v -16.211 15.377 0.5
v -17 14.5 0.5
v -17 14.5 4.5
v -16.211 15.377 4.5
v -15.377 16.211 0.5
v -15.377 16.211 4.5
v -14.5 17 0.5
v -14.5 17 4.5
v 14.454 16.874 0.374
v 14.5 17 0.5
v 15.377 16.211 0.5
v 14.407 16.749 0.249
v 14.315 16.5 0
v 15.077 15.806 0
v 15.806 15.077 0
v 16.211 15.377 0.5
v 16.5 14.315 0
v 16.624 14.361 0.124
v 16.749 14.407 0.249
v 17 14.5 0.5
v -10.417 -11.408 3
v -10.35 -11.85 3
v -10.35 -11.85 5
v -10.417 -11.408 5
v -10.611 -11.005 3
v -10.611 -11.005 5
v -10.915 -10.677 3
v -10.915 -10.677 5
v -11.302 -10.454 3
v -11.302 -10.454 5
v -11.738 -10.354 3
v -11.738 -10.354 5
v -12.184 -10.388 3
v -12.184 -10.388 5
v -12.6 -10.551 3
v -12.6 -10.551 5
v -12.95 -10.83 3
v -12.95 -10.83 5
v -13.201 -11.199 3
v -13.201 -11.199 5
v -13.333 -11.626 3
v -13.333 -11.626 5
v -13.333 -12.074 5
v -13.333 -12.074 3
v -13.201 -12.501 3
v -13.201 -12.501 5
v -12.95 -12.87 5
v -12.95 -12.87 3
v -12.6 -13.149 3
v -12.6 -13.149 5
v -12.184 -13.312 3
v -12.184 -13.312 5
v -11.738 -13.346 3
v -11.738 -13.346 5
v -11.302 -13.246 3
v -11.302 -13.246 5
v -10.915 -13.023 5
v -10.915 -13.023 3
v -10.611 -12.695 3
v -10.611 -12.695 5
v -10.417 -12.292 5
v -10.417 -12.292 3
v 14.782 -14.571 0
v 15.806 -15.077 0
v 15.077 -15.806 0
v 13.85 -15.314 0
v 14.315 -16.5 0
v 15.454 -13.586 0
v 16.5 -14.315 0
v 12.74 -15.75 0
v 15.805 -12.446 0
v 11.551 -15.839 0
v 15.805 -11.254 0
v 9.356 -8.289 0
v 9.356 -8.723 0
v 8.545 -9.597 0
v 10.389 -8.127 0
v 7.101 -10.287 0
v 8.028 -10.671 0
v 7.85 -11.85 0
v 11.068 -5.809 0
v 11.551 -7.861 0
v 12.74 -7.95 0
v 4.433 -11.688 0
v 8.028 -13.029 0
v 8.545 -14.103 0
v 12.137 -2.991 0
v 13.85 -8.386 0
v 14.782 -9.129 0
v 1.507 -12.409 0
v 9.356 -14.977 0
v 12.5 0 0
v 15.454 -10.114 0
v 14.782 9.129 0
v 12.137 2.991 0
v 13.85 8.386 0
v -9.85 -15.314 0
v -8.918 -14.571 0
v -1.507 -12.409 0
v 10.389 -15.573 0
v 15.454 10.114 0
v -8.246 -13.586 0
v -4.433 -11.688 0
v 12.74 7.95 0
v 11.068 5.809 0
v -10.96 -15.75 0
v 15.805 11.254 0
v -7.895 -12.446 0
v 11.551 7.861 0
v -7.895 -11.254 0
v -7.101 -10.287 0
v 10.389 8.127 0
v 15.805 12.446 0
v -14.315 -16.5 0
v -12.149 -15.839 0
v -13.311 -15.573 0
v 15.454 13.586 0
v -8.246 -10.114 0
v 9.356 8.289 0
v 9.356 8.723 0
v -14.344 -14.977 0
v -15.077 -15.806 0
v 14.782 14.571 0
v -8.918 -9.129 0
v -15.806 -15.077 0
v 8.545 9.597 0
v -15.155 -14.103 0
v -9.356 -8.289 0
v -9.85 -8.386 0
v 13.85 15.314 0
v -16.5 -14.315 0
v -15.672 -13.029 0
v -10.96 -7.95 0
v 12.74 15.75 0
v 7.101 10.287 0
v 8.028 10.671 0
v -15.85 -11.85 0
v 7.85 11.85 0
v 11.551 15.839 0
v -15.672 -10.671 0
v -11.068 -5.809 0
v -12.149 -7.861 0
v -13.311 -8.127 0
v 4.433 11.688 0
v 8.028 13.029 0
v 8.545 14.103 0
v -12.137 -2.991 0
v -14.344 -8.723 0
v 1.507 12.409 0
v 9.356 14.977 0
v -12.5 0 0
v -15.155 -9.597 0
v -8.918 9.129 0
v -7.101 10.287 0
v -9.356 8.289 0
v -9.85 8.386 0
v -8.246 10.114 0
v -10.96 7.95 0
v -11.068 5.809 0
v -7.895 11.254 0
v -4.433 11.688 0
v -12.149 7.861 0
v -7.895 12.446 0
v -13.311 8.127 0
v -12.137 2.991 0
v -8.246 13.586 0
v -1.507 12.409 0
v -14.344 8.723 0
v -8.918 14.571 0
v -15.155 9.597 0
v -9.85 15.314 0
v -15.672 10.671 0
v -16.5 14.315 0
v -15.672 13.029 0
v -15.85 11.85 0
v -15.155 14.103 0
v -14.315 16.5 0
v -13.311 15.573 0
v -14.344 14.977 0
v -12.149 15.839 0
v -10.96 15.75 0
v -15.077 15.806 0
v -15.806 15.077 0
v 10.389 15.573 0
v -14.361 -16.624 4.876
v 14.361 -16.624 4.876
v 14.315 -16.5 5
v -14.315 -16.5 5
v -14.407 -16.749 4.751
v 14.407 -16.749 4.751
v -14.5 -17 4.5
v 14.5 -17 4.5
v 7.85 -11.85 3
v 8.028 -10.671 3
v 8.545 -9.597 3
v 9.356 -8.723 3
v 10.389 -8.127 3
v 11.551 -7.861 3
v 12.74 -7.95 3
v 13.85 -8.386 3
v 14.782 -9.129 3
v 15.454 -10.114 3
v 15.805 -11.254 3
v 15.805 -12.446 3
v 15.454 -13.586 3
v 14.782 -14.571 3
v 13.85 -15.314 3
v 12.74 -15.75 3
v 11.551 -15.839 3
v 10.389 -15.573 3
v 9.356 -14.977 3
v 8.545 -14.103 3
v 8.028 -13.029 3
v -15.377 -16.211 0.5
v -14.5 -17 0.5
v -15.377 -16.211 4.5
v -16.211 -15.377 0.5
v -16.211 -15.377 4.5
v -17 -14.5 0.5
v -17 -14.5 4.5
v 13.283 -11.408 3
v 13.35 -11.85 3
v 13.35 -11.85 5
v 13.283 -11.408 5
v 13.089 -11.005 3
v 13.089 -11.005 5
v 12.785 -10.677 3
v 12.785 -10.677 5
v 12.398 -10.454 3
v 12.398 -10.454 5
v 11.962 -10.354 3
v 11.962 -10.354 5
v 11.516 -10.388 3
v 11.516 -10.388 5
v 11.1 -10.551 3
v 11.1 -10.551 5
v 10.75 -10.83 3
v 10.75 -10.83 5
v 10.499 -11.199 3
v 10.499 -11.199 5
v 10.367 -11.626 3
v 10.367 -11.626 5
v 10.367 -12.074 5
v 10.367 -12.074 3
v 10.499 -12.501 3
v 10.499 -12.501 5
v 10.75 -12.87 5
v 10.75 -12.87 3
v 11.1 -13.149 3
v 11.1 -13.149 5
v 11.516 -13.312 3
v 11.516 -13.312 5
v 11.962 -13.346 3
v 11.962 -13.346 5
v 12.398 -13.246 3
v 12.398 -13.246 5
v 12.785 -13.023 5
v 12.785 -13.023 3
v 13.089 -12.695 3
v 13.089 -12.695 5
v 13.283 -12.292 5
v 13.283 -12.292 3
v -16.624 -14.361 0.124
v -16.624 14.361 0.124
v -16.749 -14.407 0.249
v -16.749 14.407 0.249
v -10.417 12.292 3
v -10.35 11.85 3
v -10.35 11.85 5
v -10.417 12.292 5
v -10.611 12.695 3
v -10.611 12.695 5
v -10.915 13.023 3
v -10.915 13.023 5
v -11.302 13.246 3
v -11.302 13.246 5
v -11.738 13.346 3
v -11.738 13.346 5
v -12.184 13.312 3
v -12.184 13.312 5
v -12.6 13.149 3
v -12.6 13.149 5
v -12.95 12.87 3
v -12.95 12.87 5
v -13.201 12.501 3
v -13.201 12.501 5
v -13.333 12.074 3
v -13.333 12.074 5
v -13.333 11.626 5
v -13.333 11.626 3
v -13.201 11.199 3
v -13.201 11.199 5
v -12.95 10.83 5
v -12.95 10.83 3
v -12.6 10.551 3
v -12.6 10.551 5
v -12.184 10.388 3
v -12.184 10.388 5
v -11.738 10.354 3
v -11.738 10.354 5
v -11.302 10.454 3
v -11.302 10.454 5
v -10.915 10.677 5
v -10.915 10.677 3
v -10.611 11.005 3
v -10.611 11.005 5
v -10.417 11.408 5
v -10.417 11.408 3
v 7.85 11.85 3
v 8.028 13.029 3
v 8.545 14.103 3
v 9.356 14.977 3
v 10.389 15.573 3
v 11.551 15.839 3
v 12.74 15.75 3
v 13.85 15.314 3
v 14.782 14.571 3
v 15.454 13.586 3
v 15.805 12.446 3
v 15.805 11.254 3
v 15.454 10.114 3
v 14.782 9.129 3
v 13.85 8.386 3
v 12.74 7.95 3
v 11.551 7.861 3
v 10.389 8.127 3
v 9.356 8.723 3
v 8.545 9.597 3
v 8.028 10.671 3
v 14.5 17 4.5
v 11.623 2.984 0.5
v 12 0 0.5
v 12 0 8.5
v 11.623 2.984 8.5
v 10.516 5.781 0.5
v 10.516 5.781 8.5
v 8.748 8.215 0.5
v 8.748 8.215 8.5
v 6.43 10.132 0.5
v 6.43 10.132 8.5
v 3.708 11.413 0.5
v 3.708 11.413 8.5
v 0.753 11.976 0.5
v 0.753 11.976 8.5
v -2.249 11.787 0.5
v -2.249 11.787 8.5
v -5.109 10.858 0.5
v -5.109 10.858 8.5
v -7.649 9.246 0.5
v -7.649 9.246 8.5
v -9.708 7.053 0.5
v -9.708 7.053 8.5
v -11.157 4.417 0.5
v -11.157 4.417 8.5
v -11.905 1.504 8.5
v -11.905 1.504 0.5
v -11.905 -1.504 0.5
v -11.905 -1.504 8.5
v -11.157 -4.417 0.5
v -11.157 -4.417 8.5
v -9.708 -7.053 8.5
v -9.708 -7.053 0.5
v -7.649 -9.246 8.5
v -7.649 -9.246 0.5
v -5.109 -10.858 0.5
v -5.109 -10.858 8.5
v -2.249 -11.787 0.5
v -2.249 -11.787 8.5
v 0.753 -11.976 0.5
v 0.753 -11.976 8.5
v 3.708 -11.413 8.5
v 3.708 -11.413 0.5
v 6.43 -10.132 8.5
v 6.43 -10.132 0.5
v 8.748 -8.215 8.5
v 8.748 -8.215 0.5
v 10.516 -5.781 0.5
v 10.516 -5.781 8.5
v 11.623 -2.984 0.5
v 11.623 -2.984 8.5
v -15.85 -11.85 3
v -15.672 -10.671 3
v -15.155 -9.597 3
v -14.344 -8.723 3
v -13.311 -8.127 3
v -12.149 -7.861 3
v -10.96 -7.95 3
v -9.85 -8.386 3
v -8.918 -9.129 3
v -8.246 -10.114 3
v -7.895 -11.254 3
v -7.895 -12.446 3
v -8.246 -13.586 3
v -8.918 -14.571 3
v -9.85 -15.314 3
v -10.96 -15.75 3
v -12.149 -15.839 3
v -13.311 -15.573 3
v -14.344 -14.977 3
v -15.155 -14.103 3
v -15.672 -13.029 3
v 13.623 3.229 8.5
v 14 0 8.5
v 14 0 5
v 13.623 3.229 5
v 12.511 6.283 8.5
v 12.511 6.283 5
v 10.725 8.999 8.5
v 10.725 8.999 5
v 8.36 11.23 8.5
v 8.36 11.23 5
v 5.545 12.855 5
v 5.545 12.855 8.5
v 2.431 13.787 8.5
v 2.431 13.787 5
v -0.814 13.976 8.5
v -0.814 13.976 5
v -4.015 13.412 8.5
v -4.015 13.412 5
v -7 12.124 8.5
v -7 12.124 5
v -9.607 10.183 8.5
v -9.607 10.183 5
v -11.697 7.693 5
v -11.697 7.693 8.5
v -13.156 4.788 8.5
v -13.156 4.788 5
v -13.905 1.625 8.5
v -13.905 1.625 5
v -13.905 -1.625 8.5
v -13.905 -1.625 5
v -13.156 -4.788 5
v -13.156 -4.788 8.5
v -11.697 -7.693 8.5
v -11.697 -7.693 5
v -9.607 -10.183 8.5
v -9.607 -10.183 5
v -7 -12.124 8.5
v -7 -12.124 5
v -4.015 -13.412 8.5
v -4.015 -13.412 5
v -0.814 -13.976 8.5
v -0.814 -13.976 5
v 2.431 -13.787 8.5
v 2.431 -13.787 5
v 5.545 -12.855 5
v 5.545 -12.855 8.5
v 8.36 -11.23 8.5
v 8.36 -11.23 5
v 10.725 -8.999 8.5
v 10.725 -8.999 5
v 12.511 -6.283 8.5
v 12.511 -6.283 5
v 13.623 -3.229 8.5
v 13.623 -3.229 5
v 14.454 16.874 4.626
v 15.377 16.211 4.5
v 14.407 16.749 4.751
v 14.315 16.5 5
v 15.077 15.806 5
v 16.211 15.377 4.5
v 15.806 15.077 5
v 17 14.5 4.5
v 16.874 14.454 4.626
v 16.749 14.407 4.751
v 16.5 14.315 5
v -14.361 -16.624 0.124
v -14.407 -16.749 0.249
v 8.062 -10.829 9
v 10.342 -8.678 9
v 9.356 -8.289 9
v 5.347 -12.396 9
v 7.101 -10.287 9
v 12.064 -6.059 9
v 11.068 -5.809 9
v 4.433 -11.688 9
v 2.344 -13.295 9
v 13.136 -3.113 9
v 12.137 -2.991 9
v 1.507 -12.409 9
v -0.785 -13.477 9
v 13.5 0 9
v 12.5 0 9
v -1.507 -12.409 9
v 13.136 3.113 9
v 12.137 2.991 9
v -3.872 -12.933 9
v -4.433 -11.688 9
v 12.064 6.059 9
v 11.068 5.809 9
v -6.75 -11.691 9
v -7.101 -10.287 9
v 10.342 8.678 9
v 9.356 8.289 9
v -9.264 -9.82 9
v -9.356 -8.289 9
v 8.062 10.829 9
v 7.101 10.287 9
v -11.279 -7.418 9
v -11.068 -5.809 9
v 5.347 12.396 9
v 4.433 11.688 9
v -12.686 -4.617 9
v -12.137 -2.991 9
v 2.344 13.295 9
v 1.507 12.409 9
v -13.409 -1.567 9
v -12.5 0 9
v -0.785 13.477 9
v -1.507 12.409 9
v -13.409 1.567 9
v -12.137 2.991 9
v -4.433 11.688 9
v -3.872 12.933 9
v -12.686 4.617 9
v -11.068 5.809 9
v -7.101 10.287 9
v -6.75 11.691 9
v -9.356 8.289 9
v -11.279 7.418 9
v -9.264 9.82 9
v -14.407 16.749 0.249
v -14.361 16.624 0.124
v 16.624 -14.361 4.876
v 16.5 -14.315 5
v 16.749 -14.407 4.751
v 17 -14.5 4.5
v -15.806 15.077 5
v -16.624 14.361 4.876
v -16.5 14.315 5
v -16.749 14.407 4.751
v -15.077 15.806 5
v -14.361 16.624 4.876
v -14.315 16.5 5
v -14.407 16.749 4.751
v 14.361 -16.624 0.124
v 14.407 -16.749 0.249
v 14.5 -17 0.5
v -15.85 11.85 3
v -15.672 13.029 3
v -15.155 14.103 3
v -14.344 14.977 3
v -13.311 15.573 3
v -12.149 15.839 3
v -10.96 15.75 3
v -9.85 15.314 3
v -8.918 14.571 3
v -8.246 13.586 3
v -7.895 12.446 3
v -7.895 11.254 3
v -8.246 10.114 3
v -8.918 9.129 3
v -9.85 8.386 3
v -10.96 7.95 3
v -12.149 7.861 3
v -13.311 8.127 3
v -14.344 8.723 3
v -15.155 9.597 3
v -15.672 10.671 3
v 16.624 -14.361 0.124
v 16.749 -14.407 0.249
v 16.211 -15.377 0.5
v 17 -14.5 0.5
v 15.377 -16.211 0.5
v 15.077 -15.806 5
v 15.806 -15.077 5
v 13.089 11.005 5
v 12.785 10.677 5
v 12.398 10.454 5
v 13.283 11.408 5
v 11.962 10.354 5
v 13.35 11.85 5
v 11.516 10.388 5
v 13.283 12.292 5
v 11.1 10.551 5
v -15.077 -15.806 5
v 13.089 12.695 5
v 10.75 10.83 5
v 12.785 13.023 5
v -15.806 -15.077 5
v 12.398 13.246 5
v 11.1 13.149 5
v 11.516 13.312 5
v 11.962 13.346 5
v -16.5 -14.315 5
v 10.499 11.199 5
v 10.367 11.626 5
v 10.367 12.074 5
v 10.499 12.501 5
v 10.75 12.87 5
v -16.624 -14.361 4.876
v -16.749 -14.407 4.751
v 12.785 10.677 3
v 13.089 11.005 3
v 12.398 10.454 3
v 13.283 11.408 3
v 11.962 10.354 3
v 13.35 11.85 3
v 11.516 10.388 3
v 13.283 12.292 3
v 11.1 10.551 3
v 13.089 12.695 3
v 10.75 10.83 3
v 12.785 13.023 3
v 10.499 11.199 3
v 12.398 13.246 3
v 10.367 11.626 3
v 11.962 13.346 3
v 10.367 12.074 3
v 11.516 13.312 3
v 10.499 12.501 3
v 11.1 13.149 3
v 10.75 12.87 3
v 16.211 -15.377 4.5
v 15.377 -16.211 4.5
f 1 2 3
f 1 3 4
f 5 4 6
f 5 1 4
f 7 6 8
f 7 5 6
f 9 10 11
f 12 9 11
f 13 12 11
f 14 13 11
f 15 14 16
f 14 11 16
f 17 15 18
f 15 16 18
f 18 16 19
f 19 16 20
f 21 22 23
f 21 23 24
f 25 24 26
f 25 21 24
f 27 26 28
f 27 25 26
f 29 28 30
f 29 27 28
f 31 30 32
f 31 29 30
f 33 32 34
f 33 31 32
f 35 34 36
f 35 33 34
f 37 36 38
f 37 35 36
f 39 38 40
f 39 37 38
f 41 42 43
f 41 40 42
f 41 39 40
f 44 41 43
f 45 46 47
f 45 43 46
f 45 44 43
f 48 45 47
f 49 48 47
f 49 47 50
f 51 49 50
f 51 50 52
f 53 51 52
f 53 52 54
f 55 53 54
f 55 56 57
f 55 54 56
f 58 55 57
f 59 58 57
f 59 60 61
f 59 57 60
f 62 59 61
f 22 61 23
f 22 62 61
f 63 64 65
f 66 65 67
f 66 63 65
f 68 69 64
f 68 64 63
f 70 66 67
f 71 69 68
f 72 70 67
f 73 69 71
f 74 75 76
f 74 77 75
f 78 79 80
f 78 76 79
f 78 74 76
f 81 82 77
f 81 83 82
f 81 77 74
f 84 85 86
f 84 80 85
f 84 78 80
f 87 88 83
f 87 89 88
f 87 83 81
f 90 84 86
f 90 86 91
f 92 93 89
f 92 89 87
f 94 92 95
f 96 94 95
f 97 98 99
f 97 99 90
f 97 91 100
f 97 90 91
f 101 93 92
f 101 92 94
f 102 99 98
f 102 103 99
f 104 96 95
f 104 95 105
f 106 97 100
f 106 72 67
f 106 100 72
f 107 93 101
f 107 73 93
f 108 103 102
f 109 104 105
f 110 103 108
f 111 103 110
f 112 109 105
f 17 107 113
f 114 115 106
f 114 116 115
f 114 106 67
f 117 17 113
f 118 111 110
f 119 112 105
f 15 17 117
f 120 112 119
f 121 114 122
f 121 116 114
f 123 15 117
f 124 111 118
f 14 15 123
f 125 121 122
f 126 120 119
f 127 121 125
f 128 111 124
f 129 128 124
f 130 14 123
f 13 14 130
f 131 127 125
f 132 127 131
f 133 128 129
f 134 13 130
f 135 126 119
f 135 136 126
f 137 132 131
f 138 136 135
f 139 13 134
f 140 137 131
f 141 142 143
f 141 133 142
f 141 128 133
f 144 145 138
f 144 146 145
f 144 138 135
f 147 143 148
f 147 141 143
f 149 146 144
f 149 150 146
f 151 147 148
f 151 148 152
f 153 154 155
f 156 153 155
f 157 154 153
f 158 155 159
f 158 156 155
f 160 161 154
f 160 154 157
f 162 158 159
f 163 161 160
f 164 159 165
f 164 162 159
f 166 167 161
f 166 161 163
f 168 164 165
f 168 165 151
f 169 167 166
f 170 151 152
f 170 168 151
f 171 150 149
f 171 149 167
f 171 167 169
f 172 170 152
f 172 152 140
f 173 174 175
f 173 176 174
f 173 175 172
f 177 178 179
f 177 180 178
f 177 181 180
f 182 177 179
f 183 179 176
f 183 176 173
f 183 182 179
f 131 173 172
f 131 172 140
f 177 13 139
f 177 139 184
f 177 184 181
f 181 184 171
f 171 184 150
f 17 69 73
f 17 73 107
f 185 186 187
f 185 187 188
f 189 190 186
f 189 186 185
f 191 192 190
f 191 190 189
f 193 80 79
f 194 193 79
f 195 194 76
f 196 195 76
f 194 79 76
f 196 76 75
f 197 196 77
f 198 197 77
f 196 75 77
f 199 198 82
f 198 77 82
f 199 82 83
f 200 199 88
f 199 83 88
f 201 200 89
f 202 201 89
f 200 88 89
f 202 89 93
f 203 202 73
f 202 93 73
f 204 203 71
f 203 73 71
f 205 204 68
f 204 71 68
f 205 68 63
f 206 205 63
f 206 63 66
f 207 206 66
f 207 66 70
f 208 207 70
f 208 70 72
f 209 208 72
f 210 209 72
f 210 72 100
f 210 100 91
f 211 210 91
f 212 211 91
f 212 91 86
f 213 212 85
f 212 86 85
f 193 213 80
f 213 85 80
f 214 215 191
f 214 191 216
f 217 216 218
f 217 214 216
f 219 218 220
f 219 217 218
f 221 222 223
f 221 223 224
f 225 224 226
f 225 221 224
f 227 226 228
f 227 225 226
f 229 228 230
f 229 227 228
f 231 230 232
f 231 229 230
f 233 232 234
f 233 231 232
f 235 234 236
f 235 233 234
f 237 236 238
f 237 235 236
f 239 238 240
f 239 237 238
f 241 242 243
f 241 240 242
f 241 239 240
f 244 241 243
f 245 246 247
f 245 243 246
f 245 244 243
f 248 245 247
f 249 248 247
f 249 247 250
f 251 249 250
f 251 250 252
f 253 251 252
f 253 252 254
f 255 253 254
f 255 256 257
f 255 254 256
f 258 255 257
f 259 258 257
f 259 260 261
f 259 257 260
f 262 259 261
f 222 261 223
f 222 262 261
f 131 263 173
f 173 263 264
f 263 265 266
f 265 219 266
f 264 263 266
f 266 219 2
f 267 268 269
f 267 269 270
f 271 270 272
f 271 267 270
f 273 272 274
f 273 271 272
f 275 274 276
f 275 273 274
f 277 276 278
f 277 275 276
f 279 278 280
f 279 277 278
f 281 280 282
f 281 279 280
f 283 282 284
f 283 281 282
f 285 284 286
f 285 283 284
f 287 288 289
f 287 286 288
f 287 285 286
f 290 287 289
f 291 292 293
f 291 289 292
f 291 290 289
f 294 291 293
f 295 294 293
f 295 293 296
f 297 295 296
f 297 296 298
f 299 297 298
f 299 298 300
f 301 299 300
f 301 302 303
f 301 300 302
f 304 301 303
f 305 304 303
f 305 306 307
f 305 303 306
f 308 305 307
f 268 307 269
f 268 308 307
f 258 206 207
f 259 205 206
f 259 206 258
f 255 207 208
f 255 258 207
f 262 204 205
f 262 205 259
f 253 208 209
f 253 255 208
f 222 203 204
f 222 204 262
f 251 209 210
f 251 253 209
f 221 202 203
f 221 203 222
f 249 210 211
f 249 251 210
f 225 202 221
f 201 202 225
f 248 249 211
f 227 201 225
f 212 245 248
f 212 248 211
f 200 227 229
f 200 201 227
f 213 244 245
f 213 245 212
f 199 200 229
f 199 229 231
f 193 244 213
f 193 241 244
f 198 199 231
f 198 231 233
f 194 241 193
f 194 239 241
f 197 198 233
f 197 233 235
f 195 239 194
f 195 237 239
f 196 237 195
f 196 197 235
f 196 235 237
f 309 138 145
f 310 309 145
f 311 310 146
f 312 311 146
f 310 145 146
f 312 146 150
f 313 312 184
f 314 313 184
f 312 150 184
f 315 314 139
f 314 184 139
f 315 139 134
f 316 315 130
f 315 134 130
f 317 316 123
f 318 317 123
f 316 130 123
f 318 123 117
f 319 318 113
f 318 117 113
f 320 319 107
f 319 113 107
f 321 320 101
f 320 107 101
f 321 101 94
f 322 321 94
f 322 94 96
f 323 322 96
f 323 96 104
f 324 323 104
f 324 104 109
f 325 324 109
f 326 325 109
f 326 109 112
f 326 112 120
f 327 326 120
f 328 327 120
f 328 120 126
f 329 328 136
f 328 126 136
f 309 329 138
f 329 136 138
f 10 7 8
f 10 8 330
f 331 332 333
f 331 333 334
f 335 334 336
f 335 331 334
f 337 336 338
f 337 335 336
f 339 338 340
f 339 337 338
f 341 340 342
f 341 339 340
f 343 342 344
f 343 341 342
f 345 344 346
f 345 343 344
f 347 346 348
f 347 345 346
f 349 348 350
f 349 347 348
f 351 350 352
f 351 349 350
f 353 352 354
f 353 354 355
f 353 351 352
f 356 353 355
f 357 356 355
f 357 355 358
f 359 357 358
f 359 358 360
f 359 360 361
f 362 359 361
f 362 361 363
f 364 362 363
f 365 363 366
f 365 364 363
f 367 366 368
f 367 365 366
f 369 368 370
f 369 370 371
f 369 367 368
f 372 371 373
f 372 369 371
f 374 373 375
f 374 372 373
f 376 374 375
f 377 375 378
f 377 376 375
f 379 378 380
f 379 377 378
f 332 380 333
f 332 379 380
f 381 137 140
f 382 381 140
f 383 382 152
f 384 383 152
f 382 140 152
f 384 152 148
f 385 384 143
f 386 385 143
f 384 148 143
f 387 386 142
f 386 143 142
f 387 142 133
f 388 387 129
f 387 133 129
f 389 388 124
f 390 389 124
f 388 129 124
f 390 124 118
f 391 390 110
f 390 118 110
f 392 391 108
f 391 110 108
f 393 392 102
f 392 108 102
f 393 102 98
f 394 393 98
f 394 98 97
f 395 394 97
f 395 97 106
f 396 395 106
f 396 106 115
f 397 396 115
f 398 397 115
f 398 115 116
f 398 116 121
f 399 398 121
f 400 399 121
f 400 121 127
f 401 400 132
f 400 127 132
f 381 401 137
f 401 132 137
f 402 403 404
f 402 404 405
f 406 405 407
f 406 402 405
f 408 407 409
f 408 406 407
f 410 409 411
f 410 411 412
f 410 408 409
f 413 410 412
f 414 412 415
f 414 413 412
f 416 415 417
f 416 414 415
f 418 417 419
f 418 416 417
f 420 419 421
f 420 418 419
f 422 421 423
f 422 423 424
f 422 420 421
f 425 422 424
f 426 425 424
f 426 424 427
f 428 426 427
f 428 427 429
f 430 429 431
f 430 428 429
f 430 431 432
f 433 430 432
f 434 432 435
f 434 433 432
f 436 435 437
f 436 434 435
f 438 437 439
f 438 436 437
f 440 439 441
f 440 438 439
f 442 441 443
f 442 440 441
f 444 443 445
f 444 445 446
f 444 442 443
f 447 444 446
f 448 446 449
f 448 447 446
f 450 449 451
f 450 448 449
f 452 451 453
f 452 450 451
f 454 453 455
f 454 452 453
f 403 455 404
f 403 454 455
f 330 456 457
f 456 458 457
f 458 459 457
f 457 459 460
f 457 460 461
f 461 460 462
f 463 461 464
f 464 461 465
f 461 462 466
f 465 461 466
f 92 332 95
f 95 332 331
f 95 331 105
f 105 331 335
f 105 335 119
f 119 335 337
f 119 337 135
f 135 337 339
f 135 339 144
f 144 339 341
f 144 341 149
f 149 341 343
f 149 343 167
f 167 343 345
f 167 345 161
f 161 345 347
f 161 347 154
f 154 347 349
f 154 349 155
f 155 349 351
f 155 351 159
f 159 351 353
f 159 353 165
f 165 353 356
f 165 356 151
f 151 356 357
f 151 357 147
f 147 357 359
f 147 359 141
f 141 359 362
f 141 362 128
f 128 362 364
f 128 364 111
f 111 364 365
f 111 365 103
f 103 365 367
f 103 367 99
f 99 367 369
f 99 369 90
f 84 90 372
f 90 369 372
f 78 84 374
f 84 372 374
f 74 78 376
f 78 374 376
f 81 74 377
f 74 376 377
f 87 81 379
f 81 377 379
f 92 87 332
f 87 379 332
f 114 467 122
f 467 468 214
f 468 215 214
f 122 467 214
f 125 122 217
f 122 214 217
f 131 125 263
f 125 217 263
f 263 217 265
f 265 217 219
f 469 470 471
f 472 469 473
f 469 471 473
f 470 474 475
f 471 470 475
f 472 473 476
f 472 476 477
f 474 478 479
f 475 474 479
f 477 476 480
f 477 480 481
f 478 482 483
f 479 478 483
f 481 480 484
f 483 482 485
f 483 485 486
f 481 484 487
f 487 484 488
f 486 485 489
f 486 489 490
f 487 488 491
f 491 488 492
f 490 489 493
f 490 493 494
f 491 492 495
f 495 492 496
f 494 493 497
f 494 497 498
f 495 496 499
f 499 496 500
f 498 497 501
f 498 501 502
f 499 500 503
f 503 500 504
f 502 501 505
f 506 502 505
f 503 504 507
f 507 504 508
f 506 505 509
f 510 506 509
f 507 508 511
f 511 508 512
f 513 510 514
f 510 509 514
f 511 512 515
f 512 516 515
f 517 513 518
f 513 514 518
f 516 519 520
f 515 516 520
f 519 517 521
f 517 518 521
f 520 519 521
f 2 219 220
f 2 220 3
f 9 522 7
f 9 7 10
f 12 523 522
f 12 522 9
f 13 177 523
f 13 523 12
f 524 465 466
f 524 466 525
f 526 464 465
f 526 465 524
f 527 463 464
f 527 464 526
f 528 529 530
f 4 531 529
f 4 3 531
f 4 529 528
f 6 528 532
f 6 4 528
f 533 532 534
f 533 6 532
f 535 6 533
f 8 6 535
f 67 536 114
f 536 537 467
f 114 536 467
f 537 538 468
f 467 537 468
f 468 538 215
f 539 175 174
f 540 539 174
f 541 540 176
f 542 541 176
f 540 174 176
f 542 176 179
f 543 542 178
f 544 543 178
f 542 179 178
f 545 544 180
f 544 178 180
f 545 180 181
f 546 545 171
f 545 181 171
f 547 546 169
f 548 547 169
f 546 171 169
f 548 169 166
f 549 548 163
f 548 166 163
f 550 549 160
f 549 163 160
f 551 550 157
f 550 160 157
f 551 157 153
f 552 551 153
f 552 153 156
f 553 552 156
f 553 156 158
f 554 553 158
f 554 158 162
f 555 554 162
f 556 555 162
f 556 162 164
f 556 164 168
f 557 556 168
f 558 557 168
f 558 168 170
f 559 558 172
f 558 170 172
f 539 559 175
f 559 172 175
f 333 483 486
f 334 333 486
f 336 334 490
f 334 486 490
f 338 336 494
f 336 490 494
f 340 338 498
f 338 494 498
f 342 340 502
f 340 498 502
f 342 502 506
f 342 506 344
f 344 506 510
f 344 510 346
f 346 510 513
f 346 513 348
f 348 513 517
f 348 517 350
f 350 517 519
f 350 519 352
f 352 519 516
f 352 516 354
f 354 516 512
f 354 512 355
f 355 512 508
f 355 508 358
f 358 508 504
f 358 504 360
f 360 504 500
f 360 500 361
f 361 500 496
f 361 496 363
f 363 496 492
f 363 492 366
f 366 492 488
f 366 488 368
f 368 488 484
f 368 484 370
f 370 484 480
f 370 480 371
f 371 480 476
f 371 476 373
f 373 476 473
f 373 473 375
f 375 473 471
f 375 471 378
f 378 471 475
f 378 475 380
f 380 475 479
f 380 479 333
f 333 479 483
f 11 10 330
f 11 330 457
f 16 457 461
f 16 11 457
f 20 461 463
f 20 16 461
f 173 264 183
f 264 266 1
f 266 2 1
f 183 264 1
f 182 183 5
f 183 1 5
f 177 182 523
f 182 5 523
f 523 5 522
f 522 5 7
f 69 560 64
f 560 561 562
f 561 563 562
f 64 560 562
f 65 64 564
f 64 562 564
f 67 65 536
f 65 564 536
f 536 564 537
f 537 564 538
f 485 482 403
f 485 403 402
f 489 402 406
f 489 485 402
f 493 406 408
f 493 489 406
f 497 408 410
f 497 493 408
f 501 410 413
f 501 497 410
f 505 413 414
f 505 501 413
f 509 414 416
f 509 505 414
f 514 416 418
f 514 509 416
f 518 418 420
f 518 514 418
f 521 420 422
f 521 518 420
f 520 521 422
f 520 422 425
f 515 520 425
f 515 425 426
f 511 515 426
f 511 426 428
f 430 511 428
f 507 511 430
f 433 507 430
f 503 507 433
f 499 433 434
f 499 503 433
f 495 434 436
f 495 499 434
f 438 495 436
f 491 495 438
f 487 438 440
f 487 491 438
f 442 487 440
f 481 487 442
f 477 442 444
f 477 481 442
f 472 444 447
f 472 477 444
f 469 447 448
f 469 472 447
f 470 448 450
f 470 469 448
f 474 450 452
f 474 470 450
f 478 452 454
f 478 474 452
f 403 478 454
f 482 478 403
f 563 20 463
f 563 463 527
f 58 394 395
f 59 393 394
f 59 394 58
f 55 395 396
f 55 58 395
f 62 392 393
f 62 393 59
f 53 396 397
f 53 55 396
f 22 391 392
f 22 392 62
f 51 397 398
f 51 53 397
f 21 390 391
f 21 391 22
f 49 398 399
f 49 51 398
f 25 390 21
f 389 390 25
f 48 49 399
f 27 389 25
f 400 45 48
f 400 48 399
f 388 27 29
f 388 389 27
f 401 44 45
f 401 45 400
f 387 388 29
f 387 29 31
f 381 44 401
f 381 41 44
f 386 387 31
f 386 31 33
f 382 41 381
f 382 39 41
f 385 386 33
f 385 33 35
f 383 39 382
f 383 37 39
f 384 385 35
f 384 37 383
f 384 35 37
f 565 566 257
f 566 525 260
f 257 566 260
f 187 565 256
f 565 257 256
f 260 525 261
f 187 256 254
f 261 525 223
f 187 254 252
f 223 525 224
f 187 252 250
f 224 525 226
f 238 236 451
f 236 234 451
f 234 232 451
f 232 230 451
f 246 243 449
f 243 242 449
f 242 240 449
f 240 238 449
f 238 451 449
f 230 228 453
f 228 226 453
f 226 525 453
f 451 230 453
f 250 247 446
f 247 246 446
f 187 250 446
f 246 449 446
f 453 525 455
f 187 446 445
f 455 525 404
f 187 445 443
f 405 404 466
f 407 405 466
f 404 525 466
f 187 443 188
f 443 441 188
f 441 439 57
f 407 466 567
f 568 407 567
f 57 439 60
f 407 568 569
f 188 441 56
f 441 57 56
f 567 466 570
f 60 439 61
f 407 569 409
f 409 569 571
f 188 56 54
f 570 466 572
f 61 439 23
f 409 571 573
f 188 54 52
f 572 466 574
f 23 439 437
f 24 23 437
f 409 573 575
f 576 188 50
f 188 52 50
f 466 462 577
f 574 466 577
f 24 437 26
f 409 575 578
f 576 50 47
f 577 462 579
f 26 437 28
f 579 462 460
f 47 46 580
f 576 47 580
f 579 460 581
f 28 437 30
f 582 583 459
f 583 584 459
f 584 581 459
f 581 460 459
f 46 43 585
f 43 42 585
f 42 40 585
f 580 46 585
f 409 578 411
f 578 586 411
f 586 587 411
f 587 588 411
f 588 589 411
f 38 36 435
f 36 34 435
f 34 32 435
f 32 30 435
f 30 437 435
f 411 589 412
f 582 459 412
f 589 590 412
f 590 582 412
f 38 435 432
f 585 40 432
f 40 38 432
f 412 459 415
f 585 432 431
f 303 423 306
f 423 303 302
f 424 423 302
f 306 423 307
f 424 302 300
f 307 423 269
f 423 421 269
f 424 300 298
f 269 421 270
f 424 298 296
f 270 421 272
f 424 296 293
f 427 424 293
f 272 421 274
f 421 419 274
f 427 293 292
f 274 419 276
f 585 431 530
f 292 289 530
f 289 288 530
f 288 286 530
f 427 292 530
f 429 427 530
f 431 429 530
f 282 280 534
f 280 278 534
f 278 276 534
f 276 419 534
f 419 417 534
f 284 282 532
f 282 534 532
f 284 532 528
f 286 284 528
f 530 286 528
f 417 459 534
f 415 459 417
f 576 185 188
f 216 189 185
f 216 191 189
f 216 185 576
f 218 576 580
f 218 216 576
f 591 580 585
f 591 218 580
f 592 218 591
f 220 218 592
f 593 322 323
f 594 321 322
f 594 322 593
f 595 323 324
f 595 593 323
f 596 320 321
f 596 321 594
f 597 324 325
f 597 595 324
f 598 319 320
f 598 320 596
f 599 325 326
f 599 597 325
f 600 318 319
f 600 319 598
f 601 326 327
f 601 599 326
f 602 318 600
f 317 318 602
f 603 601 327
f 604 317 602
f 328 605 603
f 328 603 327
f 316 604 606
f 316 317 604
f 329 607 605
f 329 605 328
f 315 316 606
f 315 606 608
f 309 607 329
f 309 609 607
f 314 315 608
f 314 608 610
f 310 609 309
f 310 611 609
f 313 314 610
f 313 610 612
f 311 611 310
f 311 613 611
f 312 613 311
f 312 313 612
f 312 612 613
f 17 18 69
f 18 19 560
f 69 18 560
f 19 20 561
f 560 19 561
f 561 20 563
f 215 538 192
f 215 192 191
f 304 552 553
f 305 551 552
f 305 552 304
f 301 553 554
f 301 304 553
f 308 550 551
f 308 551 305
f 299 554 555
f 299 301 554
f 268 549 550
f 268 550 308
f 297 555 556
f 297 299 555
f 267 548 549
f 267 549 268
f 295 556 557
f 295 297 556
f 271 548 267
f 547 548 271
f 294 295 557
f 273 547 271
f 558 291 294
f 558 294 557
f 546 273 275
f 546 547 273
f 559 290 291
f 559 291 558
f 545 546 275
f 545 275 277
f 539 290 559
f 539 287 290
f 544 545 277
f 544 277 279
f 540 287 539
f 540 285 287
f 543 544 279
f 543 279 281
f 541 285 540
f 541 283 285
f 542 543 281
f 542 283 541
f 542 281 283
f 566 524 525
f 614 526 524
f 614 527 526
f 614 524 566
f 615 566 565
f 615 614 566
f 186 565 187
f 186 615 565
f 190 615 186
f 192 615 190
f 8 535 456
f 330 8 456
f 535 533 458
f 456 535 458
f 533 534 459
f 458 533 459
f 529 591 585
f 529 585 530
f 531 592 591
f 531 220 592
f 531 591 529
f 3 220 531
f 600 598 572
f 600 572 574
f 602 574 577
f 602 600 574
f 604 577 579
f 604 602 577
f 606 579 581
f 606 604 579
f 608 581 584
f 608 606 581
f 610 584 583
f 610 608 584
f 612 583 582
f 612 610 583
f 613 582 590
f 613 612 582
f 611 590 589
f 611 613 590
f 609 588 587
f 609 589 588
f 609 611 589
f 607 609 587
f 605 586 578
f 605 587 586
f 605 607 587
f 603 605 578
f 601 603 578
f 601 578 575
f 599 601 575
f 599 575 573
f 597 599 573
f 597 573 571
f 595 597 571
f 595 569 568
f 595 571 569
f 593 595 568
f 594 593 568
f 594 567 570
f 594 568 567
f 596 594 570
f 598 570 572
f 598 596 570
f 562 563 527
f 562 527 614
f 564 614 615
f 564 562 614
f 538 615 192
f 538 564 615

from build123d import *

# Parameters (mm, degrees)
SKETCH1_R           = 1.5
SKETCH1_R_2         = 12
BOSS_EXTRUDE1_DEPTH = 9
SKETCH2_R           = 14
CUT_EXTRUDE1_DEPTH  = 4
SKETCH3_R           = 4
CUT_EXTRUDE2_DEPTH  = 3
CHAMFER1_SIZE       = 0.5
CHAMFER2_SIZE       = 0.5


with BuildPart() as part:
    # Sketch1 → Boss-Extrude1 (new body)
    with BuildSketch(Plane.XY):
        with BuildLine():
            Line((-14.5, 17), (14.5, 17))
            ThreePointArc((14.5, 17), (15.799525309, 15.799525309), (17, 14.5))
            Line((17, 14.5), (17, -14.5))
            ThreePointArc((17, -14.5), (15.799525309, -15.799525309), (14.5, -17))
            Line((14.5, -17), (-14.5, -17))
            ThreePointArc((-14.5, -17), (-15.799525309, -15.799525309), (-17, -14.5))
            Line((-17, -14.5), (-17, 14.5))
            ThreePointArc((-17, 14.5), (-15.799525309, 15.799525309), (-14.5, 17))
        make_face()
        with Locations((-11.85, 11.85)):
            Circle(SKETCH1_R, mode=Mode.SUBTRACT)
        with Locations((11.85, 11.85)):
            Circle(SKETCH1_R, mode=Mode.SUBTRACT)
        with Locations((11.85, -11.85)):
            Circle(SKETCH1_R, mode=Mode.SUBTRACT)
        with Locations((-11.85, -11.85)):
            Circle(SKETCH1_R, mode=Mode.SUBTRACT)
        Circle(SKETCH1_R_2, mode=Mode.SUBTRACT)
    extrude(amount=BOSS_EXTRUDE1_DEPTH)

    # Sketch2 → Cut-Extrude1 (cut)
    with BuildSketch(Plane.XY.offset(9)):
        with BuildLine():
            Line((-14.5, 17), (14.5, 17))
            ThreePointArc((14.5, 17), (15.799525309, 15.799525309), (17, 14.5))
            Line((17, 14.5), (17, -14.5))
            ThreePointArc((17, -14.5), (15.799525309, -15.799525309), (14.5, -17))
            Line((14.5, -17), (-14.5, -17))
            ThreePointArc((-14.5, -17), (-15.799525309, -15.799525309), (-17, -14.5))
            Line((-17, -14.5), (-17, 14.5))
            ThreePointArc((-17, 14.5), (-15.799525309, 15.799525309), (-14.5, 17))
        make_face()
        Circle(SKETCH2_R, mode=Mode.SUBTRACT)
    extrude(amount=-CUT_EXTRUDE1_DEPTH, mode=Mode.SUBTRACT)

    # Sketch3 → Cut-Extrude2 (cut)
    with BuildSketch(Plane(origin=(0, 0, 0), x_dir=(-1, 0, 0), z_dir=(0, 0, -1))):
        with Locations((-11.85, 11.85)):
            Circle(SKETCH3_R)
        with Locations((11.85, 11.85)):
            Circle(SKETCH3_R)
        with Locations((11.85, -11.85)):
            Circle(SKETCH3_R)
        with Locations((-11.85, -11.85)):
            Circle(SKETCH3_R)
    extrude(amount=-CUT_EXTRUDE2_DEPTH, mode=Mode.SUBTRACT)

    # Chamfer1
    chamfer1_edges = [part.edges().sort_by_distance(p)[0] for p in [
        (-17, 0, 0),
        (-15.799525309, 15.799525309, 0),
        (-15.799525309, 15.799525309, 5),
        (0, 17, 5),
        (15.799525309, 15.799525309, 5),
        (17, 0, 5),
        (15.799525309, -15.799525309, 5),
        (0, -17, 5),
        (-15.799525309, -15.799525309, 5),
        (-17, 0, 5),
        (0, 17, 0),
        (15.799525309, 15.799525309, 0),
        (17, 0, 0),
        (15.799525309, -15.799525309, 0),
        (0, -17, 0),
        (-15.799525309, -15.799525309, 0),
    ]]
    chamfer(chamfer1_edges, length=CHAMFER1_SIZE)

    # Chamfer2
    chamfer2_edges = [part.edges().sort_by_distance(p)[0] for p in [
        (-12, 0, 0),
        (-12, 0, 9),
        (-14, 0, 9),
    ]]
    chamfer(chamfer2_edges, length=CHAMFER2_SIZE)


solid = part.part
